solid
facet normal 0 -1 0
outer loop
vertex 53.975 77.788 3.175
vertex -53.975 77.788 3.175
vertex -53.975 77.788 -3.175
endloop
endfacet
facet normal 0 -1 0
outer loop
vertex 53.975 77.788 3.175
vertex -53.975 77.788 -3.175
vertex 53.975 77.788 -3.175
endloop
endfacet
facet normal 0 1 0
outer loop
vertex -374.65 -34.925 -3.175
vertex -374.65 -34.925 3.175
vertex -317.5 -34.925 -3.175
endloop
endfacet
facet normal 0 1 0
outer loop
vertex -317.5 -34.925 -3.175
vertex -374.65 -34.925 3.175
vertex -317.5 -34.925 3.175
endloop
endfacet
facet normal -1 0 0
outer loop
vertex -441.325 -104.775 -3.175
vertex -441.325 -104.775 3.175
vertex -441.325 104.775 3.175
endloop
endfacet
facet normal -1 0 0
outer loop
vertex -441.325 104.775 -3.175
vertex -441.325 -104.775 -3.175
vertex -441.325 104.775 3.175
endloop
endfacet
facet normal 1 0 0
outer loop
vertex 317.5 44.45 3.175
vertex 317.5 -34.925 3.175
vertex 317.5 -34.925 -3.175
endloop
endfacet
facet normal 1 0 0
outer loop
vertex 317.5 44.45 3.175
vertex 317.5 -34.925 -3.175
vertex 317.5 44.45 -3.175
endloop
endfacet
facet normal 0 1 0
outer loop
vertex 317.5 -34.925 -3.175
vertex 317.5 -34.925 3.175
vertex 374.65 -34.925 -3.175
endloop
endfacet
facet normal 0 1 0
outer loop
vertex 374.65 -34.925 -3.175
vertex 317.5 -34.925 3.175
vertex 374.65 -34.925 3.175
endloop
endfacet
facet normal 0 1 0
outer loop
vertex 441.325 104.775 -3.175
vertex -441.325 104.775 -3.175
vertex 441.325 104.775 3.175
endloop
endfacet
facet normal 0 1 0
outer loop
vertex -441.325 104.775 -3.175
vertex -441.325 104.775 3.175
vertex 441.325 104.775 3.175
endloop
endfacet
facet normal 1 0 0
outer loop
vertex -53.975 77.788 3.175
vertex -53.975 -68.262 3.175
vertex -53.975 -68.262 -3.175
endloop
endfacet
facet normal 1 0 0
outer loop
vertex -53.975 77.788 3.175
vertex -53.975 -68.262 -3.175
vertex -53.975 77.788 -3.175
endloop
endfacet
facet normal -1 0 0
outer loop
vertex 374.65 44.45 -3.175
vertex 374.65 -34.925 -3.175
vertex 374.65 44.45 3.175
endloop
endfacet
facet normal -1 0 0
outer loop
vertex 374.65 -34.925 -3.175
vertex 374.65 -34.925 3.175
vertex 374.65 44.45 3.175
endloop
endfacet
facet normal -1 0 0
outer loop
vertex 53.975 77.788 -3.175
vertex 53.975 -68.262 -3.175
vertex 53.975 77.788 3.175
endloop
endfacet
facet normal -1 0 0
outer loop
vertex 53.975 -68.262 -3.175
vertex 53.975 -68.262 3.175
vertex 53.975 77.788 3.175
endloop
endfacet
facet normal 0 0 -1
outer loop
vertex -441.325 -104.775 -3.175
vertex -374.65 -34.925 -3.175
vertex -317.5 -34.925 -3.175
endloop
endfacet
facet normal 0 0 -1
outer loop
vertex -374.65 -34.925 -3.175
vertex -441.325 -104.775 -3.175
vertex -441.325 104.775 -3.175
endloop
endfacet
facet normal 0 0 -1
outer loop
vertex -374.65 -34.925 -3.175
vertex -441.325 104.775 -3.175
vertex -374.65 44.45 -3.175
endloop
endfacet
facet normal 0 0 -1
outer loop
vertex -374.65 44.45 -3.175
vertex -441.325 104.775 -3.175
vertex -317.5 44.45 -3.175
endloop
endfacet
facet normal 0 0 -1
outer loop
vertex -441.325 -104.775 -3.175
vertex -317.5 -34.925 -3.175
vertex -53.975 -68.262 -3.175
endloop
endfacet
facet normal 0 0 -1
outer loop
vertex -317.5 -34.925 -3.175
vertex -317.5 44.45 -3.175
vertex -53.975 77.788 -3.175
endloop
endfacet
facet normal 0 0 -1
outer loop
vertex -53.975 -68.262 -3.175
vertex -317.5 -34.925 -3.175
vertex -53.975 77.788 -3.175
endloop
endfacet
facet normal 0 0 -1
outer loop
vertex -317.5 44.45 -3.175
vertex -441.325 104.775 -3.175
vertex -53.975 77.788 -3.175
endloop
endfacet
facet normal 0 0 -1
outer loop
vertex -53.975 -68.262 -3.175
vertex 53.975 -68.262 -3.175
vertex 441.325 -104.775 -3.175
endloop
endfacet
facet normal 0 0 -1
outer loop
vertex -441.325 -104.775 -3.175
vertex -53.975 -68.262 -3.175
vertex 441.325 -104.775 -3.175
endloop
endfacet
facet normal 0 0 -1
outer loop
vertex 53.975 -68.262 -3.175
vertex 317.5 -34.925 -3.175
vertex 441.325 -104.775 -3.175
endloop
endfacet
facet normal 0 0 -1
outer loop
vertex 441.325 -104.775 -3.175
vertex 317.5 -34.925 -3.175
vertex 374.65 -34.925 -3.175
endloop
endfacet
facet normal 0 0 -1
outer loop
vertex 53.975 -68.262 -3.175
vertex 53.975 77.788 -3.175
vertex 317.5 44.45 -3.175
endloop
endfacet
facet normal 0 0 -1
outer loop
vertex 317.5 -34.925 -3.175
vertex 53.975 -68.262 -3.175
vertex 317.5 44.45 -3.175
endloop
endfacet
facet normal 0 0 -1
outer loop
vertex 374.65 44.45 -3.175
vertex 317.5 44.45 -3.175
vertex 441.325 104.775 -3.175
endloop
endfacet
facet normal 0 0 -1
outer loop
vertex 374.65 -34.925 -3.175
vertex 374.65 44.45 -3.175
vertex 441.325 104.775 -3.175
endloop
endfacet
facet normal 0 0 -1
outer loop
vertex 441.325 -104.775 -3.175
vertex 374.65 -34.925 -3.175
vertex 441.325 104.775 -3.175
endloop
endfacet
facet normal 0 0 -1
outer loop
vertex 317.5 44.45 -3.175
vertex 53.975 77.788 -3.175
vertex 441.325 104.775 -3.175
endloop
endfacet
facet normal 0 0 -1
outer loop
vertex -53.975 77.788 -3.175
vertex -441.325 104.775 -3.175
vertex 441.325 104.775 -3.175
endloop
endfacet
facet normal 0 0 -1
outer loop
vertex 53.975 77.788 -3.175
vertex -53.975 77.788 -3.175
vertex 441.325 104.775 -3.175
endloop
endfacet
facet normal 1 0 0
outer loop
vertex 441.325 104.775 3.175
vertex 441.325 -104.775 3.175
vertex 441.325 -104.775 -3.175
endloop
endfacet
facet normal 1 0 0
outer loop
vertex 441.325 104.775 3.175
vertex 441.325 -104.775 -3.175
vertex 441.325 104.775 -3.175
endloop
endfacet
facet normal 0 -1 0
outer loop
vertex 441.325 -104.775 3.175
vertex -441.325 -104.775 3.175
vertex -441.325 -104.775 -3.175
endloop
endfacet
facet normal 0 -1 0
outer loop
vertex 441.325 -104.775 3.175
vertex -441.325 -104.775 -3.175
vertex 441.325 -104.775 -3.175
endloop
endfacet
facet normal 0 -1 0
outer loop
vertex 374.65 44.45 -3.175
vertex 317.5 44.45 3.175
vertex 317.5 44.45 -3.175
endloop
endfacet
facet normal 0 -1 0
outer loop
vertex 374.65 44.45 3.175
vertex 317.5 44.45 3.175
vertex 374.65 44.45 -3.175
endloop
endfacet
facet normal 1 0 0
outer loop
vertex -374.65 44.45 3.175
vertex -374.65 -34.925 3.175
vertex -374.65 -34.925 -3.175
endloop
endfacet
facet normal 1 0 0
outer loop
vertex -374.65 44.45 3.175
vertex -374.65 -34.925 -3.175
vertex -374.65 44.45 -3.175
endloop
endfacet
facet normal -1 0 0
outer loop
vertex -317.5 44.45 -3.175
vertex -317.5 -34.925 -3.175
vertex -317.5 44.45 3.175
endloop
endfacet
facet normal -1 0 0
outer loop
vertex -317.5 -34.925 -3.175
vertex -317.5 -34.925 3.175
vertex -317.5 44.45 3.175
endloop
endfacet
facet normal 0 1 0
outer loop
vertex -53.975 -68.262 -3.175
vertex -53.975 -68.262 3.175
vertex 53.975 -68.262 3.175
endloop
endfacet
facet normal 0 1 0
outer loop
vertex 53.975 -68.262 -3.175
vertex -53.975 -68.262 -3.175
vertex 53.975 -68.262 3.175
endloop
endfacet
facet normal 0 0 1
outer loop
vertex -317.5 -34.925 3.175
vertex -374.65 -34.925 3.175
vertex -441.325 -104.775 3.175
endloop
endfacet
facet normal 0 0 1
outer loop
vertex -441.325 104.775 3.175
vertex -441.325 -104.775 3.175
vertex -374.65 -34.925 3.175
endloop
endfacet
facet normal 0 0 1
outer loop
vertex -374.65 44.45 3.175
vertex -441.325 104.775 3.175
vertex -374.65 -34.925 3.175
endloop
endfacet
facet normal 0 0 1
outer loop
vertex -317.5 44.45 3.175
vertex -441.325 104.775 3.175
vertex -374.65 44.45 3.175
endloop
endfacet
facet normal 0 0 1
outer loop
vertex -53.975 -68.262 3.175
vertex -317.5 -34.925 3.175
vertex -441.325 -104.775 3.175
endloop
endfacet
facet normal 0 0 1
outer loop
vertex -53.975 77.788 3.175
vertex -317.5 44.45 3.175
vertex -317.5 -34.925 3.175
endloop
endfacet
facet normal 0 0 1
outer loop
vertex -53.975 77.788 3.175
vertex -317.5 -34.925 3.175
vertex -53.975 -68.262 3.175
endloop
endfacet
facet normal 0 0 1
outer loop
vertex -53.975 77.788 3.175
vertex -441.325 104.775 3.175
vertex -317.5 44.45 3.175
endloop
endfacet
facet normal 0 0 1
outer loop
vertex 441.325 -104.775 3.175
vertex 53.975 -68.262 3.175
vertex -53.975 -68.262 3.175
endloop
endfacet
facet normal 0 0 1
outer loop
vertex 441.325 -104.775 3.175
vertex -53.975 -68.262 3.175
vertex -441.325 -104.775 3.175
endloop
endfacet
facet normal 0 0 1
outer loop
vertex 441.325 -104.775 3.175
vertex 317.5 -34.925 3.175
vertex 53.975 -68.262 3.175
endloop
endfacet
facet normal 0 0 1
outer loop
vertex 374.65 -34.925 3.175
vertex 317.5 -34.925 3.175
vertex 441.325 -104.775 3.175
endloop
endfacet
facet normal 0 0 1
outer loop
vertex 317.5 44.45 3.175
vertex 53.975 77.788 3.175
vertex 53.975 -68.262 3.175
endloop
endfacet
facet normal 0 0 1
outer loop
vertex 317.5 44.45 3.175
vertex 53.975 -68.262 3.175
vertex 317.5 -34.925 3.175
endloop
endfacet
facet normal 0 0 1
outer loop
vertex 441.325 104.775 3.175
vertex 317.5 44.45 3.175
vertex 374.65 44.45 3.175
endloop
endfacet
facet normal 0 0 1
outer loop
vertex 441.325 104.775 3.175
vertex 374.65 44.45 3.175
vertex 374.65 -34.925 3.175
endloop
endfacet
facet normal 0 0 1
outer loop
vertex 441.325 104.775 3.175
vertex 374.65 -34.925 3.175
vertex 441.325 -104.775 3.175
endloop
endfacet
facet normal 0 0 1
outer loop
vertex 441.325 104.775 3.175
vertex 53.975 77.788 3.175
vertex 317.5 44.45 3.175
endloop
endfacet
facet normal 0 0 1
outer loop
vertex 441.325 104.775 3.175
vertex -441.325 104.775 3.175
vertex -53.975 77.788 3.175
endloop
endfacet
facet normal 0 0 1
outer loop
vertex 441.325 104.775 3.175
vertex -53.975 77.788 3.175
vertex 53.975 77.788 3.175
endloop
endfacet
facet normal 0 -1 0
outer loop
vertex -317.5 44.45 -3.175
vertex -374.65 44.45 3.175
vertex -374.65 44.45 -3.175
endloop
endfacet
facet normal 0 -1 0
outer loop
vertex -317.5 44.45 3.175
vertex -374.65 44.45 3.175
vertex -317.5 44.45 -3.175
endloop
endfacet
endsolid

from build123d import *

# Parameters (mm, degrees)
F0_W     = 882.65
F0_H     = 209.55
F0_W_2   = 57.15
F0_H_2   = 79.375
F0_W_3   = 107.95
F0_H_3   = 146.05
F1_DEPTH = 3.175


with BuildPart() as f1:
    # F0 (on Top) → F1 (new body, symmetric)
    with BuildSketch(Plane.XY):
        Rectangle(F0_W, F0_H)
        with Locations((-346.075, 4.7625)):
            Rectangle(F0_W_2, F0_H_2, mode=Mode.SUBTRACT)
        with Locations((0, 4.7625)):
            Rectangle(F0_W_3, F0_H_3, mode=Mode.SUBTRACT)
        with Locations((346.075, 4.7625)):
            Rectangle(F0_W_2, F0_H_2, mode=Mode.SUBTRACT)
    extrude(amount=F1_DEPTH, both=True)


solid = f1.part
